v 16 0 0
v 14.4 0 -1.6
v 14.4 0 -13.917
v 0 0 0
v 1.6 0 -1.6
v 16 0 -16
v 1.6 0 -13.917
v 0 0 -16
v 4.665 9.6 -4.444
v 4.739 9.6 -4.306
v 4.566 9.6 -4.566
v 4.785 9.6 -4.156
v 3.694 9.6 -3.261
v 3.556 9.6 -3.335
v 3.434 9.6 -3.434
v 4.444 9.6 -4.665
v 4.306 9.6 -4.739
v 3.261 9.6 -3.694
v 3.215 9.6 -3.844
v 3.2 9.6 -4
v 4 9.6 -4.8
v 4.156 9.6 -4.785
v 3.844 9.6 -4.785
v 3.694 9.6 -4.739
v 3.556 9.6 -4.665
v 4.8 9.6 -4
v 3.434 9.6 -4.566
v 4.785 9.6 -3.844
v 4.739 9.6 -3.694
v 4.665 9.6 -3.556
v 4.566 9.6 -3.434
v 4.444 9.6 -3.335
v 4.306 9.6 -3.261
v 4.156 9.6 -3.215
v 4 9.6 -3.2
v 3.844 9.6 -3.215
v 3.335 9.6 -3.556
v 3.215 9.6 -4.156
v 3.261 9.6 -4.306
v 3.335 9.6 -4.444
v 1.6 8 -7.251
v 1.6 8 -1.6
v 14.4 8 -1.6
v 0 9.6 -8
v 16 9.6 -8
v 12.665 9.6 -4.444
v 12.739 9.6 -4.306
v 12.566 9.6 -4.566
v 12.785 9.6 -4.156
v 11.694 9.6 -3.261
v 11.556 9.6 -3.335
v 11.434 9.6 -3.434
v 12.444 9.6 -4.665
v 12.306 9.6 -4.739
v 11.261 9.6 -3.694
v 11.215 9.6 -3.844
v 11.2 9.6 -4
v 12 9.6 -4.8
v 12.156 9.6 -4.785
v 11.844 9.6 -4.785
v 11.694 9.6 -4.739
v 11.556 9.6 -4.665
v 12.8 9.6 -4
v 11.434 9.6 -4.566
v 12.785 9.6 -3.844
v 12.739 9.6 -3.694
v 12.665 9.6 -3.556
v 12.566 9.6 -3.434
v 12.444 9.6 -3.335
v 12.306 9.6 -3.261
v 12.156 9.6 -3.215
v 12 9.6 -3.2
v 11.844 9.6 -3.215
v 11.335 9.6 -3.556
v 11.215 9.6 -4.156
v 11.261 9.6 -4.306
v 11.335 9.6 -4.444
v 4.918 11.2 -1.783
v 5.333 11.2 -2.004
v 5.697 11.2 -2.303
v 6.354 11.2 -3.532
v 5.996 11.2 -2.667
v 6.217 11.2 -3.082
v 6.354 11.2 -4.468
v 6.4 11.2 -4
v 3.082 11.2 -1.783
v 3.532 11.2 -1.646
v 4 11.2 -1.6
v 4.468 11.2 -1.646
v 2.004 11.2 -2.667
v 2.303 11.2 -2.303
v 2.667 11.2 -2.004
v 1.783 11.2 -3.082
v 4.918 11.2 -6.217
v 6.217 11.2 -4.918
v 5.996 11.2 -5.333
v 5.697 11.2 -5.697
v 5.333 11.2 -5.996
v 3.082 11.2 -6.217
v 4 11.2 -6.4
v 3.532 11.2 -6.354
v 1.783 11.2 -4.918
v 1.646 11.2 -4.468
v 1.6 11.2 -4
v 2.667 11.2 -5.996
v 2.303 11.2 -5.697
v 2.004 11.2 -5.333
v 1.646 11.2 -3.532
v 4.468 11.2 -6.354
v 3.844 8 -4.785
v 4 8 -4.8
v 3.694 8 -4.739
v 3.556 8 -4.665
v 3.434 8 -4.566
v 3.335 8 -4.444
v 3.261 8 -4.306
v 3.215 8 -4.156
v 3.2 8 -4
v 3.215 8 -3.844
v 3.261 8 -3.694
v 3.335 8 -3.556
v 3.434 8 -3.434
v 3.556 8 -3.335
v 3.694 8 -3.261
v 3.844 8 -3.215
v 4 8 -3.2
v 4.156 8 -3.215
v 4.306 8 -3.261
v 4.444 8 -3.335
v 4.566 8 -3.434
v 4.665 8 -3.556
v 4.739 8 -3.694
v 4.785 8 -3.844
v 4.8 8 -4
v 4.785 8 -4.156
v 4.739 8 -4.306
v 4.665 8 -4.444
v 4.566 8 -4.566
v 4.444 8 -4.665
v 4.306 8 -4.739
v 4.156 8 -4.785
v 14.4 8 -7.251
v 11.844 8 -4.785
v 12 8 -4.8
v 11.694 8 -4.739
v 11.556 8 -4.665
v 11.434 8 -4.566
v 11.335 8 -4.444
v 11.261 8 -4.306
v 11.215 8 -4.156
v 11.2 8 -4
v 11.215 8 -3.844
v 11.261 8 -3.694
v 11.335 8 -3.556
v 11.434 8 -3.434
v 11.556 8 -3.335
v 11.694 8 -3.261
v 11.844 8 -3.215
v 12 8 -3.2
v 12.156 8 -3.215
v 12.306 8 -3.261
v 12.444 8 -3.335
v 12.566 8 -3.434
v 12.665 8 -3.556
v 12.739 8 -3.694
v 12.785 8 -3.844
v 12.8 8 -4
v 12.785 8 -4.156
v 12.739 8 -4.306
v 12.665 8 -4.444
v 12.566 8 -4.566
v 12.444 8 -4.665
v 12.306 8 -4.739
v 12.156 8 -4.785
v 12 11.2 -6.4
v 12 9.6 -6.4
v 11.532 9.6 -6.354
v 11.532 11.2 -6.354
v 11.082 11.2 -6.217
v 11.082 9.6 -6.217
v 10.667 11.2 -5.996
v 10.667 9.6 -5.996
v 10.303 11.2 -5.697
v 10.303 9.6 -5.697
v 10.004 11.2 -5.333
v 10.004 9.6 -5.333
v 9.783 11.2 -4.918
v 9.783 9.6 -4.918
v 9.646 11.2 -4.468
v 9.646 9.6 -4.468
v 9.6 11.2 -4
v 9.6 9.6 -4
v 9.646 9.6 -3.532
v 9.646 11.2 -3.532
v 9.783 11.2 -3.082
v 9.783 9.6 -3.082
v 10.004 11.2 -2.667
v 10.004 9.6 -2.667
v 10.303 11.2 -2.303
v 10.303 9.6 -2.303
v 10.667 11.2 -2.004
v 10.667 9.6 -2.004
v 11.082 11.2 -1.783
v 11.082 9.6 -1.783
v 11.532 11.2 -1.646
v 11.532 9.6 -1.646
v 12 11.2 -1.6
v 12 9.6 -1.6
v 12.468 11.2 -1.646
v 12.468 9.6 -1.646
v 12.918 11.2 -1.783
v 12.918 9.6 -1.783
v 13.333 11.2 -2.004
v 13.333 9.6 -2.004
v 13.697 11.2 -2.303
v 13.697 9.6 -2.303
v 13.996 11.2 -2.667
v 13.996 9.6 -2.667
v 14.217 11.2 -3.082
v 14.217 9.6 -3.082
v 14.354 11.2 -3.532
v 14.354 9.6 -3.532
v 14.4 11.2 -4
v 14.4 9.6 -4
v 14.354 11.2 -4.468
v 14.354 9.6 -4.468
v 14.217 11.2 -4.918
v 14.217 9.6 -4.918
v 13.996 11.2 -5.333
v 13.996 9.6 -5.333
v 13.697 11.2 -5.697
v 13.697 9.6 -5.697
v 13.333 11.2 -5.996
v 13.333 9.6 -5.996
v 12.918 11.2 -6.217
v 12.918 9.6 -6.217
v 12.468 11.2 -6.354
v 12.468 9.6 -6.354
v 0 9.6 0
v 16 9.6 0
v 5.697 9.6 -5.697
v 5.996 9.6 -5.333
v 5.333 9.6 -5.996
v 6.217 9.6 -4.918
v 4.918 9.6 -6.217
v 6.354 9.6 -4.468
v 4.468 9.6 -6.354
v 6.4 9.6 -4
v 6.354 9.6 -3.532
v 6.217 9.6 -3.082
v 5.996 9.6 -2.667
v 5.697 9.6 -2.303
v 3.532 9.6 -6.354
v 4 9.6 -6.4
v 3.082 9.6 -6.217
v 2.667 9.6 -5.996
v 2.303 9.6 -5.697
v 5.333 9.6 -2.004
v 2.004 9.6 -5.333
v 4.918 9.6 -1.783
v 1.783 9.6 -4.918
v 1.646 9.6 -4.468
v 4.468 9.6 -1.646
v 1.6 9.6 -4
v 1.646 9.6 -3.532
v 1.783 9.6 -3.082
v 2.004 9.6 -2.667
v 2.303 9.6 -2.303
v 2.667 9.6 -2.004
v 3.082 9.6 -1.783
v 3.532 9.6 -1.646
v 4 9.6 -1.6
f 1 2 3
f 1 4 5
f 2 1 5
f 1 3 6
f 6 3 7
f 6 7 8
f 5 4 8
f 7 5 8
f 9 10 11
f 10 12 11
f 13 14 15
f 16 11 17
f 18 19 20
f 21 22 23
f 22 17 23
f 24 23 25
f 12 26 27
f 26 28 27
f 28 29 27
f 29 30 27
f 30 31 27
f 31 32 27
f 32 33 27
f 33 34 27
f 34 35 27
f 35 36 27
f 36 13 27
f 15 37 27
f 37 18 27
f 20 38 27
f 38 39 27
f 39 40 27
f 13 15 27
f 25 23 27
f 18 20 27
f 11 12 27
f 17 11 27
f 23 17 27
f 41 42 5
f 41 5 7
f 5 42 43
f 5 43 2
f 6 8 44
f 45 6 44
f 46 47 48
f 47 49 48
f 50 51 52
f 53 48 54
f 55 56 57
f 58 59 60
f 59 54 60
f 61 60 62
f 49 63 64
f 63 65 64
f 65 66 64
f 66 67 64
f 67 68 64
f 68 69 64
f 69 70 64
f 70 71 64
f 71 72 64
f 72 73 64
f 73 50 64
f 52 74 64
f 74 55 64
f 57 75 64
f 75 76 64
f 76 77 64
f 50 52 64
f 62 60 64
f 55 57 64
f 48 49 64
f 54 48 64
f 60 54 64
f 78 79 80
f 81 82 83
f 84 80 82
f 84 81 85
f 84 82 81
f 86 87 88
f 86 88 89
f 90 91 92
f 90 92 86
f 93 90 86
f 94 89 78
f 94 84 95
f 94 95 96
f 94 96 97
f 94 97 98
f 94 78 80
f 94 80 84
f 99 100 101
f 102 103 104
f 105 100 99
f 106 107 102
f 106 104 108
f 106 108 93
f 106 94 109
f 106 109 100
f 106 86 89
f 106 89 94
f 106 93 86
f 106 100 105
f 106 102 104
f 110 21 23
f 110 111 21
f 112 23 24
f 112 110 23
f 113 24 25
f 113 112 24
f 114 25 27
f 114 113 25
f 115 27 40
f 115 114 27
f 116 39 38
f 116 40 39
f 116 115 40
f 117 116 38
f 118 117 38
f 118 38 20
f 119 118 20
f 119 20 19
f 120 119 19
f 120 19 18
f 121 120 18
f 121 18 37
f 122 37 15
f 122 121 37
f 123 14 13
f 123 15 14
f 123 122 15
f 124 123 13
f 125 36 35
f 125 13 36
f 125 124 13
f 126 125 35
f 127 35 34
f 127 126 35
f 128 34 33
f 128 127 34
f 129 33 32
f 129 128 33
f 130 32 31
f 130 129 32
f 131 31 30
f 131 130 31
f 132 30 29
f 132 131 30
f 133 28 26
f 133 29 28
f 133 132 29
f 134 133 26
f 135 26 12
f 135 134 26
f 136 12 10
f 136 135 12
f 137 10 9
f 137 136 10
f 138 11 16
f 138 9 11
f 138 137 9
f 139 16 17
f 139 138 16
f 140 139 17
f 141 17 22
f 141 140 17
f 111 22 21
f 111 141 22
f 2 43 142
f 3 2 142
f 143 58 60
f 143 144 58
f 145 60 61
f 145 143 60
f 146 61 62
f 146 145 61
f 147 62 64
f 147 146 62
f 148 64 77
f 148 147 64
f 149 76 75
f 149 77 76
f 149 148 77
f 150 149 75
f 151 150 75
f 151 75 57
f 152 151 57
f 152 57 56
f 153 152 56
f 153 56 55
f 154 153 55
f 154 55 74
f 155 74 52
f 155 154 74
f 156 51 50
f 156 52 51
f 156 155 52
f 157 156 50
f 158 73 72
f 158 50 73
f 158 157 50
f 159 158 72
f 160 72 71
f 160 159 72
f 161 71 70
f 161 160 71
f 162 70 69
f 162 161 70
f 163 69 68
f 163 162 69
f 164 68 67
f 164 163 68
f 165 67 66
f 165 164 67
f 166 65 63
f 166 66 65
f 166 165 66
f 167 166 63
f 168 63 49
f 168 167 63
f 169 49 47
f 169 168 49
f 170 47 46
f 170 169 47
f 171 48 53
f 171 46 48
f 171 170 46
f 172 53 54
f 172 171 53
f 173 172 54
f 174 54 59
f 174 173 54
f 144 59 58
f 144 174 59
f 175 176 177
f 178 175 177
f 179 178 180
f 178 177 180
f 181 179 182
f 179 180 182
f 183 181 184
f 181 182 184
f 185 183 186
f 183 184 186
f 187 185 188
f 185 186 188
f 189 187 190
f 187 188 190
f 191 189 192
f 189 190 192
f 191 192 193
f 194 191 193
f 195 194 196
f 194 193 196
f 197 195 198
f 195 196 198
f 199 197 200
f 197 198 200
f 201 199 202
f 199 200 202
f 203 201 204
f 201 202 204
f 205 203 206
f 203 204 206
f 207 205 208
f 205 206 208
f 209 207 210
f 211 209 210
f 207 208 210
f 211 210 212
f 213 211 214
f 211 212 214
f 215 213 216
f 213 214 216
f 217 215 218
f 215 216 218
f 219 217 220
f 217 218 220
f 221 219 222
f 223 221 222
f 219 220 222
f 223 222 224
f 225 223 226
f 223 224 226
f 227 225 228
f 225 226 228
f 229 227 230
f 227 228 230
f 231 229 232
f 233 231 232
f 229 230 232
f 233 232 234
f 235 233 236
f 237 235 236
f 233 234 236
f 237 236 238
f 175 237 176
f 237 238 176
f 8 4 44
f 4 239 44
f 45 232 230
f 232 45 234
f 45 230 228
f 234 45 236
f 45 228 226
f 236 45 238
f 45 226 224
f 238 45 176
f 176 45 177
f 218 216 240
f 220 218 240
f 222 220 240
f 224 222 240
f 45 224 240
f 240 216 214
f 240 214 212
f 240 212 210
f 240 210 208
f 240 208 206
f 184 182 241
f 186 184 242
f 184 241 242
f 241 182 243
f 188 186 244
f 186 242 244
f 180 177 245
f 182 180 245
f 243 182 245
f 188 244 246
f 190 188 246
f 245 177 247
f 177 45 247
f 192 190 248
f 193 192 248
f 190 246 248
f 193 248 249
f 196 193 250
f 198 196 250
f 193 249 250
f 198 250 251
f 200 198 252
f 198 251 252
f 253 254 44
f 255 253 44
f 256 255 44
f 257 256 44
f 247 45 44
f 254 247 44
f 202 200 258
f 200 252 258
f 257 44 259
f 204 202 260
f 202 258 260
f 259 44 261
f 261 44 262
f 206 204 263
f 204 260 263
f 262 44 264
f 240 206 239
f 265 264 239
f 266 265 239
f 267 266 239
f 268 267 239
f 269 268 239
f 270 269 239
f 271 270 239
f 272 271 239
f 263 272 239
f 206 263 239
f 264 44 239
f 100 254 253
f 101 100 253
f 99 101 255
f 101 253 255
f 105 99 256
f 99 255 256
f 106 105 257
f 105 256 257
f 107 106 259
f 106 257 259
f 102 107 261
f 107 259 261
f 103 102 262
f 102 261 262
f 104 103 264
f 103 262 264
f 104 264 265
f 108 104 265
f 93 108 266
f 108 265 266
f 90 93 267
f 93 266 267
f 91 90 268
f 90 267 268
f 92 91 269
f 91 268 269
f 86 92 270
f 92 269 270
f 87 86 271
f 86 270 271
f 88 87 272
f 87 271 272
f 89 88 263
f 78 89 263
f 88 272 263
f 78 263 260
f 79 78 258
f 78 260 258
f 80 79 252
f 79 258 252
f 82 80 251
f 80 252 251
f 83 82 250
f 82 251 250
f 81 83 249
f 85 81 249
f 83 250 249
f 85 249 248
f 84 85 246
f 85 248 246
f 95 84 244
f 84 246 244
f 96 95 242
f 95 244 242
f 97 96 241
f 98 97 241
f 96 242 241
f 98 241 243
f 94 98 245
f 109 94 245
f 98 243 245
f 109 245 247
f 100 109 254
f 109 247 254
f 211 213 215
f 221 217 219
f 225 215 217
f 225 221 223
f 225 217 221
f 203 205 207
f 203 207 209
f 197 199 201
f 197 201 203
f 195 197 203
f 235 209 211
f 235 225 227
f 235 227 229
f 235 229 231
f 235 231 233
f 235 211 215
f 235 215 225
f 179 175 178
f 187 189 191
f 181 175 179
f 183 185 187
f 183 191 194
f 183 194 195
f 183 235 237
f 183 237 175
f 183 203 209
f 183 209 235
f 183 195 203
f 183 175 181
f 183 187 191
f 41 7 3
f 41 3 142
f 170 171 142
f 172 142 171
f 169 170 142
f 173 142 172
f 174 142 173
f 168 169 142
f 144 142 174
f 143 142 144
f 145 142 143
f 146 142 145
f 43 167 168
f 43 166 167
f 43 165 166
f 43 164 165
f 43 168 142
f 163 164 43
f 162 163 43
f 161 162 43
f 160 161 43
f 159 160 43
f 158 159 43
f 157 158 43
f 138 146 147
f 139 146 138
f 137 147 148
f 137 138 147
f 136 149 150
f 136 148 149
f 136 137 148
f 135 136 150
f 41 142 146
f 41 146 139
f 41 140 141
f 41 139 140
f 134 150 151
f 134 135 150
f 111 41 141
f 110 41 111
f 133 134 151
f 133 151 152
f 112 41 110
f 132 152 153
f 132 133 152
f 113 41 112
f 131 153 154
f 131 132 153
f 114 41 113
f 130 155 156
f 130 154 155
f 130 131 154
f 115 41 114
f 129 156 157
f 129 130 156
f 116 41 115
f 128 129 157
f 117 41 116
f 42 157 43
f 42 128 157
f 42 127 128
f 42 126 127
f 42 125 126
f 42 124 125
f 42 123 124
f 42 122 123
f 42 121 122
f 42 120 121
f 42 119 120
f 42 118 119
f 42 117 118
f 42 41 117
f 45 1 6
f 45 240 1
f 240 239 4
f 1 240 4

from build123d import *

# Parameters (mm, degrees)
BOSS_EXTRUDE1_DEPTH = 16
SKETCH2_R           = 2.4
BOSS_EXTRUDE2_DEPTH = 1.6
LPATTERN1_COUNT     = 2
LPATTERN1_PITCH     = 8
SHELL1_T            = -1.6


with BuildPart() as part:
    # Sketch1 → Boss-Extrude1 (new body)
    with BuildSketch(Plane(origin=(0, 0, 0), x_dir=(0, 0, -1), z_dir=(1, 0, 0))):
        Polygon((0, 0), (16, 0), (8, 9.6), (0, 9.6), align=None)
    extrude(amount=BOSS_EXTRUDE1_DEPTH)

    # Sketch2 → Boss-Extrude2 (add)
    with BuildSketch(Plane(origin=(0, 9.6, 0), x_dir=(1, 0, 0), z_dir=(0, 1, 0))):
        with Locations(Location((4, 4, 0), (0, 0, 90))):
            Circle(SKETCH2_R)
    boss_extrude2 = extrude(amount=BOSS_EXTRUDE2_DEPTH)

    # LPattern1: Boss-Extrude2 ×2
    with Locations(*[(i * LPATTERN1_PITCH, 0, 0) for i in range(1, LPATTERN1_COUNT)]):
        add(boss_extrude2)

    # Shell1
    shell1_openings = [part.faces().sort_by_distance(p)[0] for p in [
        (8, 0, -8),
    ]]
    offset(amount=SHELL1_T, openings=shell1_openings, kind=Kind.INTERSECTION)


solid = part.part
